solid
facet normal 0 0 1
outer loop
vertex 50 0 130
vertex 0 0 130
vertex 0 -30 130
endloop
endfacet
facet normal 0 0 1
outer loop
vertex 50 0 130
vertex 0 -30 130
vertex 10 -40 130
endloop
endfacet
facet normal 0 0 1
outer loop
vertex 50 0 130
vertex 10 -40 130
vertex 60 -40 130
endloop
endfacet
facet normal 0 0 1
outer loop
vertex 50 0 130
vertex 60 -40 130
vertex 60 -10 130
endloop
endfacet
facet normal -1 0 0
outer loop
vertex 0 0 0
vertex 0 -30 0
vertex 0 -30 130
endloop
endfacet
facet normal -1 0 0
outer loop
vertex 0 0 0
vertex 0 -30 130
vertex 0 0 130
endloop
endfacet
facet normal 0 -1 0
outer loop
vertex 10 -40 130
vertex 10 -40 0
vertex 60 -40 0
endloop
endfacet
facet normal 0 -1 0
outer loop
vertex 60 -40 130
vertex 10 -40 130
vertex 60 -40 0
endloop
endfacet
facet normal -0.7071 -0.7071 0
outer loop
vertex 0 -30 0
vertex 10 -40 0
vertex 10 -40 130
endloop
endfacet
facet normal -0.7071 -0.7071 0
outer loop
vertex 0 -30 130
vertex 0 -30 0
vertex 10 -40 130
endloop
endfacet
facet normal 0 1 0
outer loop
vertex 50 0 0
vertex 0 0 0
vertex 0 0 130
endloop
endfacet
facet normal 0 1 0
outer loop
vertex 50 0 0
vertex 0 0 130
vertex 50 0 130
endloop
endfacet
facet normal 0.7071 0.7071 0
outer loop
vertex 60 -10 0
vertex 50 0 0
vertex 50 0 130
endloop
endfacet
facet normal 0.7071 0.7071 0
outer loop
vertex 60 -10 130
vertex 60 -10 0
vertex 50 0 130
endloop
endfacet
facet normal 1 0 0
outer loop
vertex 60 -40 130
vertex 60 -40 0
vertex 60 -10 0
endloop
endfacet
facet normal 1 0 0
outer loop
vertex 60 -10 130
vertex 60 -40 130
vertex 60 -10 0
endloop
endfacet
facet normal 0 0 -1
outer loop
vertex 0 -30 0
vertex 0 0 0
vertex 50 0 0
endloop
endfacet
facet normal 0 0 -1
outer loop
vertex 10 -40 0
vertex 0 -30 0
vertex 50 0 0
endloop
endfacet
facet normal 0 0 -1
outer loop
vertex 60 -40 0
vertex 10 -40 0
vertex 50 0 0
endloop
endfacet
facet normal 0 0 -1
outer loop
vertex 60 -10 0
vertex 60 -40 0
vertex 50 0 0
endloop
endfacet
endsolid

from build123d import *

# Parameters (mm, degrees)
SKETCH_1_W      = 60
SKETCH_1_H      = 40
EXTRUDE_1_DEPTH = 130
CHAMFER_1_SIZE  = 10


with BuildPart() as part:
    # 草图1 → 凸台-拉伸1 (new body)
    with BuildSketch(Plane.XY):
        with Locations((30, -20)):
            Rectangle(SKETCH_1_W, SKETCH_1_H)
    extrude(amount=EXTRUDE_1_DEPTH)

    # 倒角1
    chamfer_1_edges = [part.edges().sort_by_distance(p)[0] for p in [
        (60, 0, 65),
        (0, -40, 65),
    ]]
    chamfer(chamfer_1_edges, length=CHAMFER_1_SIZE)


solid = part.part
